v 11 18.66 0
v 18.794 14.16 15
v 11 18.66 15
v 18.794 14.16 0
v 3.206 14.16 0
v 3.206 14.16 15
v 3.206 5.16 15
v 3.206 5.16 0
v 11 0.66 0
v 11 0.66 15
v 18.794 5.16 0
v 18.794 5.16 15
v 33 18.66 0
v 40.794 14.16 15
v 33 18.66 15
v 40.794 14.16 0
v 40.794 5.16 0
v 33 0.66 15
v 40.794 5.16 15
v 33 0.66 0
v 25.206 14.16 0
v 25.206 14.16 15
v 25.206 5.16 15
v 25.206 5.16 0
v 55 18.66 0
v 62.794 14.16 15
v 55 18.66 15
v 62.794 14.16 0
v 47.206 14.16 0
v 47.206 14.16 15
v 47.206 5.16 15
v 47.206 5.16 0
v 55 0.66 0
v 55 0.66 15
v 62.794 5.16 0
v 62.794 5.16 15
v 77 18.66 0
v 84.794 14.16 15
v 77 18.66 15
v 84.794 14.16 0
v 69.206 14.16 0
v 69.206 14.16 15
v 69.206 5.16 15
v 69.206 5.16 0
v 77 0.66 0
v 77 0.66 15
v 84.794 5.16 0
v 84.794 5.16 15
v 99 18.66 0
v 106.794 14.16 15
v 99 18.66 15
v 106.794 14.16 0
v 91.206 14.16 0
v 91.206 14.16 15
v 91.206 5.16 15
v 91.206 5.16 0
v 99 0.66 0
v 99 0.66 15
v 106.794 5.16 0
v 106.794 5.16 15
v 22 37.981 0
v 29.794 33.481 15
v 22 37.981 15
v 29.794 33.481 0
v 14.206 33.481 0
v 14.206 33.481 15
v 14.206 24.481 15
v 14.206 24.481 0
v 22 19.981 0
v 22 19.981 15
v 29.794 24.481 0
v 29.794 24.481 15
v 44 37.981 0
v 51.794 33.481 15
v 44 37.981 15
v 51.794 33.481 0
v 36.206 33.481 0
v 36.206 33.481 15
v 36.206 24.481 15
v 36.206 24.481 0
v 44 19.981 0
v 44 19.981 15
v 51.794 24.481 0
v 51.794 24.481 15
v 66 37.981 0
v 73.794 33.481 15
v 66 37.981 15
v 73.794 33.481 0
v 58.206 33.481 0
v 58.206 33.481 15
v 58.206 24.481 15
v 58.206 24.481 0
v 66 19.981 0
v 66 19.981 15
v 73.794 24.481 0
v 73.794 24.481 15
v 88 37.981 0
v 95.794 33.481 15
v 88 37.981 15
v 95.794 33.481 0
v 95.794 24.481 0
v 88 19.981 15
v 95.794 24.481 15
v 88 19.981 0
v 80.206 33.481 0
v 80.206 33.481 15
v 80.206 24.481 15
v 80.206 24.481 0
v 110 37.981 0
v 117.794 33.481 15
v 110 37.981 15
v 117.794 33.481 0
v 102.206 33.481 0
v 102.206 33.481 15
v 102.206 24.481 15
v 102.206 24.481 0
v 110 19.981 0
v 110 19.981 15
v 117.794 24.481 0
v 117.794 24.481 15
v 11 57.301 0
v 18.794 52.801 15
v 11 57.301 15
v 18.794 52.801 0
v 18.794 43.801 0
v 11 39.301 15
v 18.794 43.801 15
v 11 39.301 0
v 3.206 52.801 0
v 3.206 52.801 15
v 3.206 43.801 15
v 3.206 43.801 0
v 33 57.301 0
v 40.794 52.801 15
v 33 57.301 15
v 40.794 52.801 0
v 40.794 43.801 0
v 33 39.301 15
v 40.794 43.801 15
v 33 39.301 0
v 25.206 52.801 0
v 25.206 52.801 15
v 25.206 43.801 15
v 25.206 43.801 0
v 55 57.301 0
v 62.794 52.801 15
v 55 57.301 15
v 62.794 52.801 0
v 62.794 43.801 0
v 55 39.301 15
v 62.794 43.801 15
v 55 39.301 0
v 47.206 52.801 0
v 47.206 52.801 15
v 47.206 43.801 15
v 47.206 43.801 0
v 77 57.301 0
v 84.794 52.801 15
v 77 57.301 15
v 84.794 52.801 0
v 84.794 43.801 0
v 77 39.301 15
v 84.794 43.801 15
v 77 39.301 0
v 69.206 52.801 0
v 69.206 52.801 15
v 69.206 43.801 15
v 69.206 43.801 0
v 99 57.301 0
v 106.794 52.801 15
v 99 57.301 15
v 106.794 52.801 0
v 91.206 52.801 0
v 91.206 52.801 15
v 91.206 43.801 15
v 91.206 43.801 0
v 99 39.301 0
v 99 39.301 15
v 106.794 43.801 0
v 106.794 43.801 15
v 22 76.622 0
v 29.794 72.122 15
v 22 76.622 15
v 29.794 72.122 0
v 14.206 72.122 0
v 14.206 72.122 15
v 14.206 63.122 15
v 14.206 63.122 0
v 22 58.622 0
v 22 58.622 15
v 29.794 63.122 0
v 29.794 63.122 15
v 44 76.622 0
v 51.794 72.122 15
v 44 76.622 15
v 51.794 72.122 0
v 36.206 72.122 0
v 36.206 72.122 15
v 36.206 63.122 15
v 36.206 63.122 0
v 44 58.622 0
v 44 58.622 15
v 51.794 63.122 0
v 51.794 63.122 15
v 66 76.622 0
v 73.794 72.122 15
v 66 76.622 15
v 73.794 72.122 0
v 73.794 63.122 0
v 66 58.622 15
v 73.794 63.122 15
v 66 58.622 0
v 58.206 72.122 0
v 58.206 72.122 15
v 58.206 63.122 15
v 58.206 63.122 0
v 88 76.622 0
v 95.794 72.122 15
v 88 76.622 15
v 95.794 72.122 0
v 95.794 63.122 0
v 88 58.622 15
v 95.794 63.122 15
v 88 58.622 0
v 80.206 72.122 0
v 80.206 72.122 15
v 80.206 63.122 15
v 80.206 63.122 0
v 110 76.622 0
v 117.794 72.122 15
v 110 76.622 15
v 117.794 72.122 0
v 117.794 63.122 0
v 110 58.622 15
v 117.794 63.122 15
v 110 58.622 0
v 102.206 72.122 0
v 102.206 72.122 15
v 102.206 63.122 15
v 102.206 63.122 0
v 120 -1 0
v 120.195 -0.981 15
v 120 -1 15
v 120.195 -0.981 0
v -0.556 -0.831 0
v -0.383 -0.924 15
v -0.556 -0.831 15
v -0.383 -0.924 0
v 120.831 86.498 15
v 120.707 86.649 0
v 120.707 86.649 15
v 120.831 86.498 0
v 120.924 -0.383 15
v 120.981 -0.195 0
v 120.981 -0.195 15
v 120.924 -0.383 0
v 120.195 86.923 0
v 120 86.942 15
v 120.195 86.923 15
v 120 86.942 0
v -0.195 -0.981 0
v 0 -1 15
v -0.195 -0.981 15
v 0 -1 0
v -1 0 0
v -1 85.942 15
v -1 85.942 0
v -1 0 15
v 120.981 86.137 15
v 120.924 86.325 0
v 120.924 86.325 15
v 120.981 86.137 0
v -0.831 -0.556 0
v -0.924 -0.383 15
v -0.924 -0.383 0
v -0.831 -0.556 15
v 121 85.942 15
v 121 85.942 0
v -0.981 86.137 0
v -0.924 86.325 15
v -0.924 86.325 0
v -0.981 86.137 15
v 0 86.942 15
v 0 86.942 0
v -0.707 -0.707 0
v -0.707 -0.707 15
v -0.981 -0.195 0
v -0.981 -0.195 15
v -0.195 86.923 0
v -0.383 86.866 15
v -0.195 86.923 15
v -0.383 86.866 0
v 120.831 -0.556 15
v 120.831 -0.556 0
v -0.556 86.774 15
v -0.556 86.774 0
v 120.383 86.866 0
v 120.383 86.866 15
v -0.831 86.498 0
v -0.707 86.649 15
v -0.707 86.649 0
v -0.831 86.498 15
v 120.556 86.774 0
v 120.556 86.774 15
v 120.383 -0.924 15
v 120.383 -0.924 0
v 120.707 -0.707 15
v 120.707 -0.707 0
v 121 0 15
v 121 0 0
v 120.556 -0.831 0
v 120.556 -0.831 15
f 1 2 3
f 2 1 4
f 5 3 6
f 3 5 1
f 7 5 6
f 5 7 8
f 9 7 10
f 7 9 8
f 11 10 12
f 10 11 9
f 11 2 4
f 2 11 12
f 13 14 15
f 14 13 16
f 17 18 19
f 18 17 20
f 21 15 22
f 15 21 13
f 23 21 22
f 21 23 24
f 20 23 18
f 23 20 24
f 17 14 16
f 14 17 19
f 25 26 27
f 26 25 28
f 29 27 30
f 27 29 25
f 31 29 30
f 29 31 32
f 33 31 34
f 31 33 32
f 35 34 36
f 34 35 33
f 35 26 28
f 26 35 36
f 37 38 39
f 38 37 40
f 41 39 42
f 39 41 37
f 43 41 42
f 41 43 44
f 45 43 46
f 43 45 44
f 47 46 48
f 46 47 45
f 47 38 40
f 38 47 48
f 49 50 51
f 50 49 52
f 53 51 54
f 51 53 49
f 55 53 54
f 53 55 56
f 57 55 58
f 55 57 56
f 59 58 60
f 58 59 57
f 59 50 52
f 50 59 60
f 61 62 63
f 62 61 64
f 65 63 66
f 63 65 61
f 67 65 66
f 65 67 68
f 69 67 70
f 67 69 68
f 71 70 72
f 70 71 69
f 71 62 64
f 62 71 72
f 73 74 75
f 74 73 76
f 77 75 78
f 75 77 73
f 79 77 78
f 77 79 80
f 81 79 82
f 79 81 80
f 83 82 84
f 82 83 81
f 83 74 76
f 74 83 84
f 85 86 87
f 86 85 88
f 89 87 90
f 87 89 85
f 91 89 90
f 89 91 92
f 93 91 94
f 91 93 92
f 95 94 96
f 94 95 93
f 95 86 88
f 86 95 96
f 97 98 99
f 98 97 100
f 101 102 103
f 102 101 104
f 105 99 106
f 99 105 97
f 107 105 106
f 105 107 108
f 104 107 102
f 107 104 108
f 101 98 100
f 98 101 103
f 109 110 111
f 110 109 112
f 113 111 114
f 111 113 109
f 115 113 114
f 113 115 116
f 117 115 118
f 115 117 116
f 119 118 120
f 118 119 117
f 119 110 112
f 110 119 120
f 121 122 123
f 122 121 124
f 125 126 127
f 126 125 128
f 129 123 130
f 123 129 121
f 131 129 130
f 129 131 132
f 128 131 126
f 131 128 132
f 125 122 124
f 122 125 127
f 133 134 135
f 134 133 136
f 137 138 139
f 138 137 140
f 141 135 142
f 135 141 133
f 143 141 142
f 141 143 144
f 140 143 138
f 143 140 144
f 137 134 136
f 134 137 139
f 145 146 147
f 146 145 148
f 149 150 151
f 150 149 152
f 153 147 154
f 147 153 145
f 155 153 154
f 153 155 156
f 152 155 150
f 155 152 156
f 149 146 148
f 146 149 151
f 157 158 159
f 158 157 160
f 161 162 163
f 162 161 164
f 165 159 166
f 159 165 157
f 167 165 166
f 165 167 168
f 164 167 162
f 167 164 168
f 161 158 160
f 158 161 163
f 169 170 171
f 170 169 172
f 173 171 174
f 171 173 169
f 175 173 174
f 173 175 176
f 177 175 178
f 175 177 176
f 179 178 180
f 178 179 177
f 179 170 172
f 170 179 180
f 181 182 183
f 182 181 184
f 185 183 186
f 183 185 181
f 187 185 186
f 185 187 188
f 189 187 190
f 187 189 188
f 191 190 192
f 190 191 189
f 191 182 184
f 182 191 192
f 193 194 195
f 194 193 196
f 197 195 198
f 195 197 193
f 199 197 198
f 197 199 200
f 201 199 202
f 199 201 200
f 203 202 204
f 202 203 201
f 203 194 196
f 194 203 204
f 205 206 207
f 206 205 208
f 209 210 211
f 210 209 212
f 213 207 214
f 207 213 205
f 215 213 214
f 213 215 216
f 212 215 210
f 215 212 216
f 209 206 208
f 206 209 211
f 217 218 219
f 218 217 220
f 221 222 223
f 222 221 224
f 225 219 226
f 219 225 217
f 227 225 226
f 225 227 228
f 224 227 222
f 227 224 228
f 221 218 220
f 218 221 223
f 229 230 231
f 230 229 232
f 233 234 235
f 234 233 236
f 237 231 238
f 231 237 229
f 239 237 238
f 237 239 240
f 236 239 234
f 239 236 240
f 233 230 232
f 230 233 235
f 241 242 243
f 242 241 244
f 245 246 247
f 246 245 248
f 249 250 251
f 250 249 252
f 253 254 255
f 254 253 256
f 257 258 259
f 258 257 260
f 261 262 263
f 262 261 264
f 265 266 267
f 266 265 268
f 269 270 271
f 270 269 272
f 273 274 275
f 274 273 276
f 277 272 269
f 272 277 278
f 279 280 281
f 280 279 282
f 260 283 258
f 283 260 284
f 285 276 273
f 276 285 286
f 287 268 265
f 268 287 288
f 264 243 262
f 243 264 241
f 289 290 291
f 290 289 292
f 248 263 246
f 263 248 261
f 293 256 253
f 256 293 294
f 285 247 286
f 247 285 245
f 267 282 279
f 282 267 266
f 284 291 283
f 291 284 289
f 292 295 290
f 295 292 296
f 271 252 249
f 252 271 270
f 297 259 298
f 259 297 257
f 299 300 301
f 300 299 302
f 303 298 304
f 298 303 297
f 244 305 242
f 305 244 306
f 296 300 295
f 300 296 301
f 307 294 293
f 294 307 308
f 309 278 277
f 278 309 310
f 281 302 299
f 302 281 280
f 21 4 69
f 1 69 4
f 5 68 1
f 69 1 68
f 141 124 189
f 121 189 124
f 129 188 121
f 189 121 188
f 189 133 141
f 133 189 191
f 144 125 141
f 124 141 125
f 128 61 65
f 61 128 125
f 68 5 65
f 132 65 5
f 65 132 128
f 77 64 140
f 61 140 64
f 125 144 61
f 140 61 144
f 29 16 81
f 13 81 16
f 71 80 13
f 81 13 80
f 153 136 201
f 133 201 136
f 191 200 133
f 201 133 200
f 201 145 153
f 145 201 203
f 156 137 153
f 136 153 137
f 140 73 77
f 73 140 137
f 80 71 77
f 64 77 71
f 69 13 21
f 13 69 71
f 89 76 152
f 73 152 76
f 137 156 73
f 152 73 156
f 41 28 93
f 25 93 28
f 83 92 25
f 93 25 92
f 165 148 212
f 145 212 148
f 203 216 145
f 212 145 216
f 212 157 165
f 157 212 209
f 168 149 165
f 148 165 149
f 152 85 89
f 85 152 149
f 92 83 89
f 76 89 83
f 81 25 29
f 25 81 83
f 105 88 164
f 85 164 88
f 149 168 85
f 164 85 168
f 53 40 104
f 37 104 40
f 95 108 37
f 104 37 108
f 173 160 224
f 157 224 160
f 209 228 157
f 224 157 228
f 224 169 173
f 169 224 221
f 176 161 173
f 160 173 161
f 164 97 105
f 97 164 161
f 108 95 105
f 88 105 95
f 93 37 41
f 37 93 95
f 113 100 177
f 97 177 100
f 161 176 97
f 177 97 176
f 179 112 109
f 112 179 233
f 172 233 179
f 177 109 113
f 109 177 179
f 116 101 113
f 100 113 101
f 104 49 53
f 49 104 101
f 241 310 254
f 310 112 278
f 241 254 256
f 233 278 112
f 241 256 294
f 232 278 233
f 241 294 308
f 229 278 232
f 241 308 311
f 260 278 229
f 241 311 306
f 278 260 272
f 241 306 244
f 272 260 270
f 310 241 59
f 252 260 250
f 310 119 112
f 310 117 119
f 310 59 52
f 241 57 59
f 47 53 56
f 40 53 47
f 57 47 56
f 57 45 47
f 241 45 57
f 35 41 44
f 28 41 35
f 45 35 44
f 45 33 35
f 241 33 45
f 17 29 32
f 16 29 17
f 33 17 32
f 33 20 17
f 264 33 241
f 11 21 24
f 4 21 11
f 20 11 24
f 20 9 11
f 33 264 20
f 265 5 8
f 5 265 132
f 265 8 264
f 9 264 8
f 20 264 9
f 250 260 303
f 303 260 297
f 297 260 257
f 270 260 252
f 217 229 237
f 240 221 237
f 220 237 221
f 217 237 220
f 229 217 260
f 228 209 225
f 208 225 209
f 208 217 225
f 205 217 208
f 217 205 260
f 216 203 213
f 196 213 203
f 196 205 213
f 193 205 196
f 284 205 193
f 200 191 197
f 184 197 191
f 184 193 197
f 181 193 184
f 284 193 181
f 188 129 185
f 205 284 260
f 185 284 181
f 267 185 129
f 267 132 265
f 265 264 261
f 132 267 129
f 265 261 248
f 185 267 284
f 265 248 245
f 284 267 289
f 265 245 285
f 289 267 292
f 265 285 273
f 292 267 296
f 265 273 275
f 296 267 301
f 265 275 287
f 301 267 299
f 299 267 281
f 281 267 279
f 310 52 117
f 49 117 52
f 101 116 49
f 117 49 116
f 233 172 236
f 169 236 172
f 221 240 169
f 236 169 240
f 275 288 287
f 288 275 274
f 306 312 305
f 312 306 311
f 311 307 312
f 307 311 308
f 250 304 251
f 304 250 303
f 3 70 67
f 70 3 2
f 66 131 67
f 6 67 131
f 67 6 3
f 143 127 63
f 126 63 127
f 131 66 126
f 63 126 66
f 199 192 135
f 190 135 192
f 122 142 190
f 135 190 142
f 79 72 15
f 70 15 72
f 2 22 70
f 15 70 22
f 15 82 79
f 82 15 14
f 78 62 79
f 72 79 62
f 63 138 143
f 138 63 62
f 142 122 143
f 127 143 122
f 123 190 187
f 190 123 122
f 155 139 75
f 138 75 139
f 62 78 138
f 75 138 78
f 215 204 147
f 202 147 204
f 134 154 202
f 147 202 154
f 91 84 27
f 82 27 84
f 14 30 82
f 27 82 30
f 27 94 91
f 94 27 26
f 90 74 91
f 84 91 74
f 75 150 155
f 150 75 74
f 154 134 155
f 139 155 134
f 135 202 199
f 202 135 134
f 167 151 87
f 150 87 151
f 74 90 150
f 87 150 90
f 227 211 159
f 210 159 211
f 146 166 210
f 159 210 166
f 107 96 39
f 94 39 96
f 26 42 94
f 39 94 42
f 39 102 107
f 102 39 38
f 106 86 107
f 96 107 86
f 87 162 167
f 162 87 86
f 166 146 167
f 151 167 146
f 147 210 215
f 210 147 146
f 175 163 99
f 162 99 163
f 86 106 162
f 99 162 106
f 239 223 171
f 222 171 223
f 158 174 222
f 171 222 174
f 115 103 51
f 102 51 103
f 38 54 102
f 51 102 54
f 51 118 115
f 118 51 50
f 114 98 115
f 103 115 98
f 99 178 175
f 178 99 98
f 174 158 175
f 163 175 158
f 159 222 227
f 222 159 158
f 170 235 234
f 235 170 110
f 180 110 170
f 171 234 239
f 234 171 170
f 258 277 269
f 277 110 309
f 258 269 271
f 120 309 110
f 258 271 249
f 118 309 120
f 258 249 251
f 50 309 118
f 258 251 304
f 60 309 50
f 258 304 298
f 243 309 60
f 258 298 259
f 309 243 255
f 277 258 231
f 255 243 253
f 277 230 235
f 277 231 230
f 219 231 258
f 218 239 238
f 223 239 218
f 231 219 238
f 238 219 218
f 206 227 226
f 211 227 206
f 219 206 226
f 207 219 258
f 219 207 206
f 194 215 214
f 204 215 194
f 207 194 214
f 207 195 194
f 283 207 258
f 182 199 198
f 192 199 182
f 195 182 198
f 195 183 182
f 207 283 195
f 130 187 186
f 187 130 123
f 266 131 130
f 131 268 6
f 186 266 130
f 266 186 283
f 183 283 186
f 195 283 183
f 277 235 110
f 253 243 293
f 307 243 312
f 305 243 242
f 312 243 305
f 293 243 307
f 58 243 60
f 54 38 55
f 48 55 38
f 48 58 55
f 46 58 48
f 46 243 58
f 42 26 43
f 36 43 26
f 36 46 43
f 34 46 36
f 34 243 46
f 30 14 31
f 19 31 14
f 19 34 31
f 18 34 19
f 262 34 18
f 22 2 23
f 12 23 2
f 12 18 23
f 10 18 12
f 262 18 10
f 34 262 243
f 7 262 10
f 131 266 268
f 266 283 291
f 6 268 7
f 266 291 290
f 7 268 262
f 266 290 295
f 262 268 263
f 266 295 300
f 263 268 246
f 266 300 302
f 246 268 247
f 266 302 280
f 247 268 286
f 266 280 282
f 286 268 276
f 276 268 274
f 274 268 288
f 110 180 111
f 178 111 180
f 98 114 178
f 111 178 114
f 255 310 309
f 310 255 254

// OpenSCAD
// Honeycomb Grid Pattern
// Creates hexagonal grid patterns for organizers, decorations, or infill
// License: CC0 (Public Domain)

/* [Grid Size] */
// Number of hexagons in X direction
cells_x = 5; // [2:20]

// Number of hexagons in Y direction
cells_y = 4; // [2:20]

// Size of each hexagon (flat-to-flat distance)
cell_size = 20; // [5:50]

/* [Dimensions] */
// Wall thickness between cells
wall_thickness = 2; // [1:0.5:5]

// Grid height (depth)
grid_height = 15; // [3:50]

// Add a bottom plate
include_bottom = "no"; // [yes, no]

// Bottom plate thickness
bottom_thickness = 1.5; // [0.5:0.5:5]

/* [Style] */
// Cell shape
cell_shape = "hexagon"; // [hexagon, circle, rounded_hex]

// Rounding for rounded_hex
hex_rounding = 2; // [0:5]

/* [Quality] */
// Render quality
$fn = 32; // [16:64]

/* [Hidden] */
// Hexagon math
hex_radius = cell_size / 2;
hex_apothem = hex_radius * cos(30);  // Distance from center to flat edge
col_spacing = cell_size + wall_thickness;
row_spacing = (hex_apothem * 2) + wall_thickness;

// Calculate overall dimensions
total_width = (cells_x * col_spacing) + (cell_size / 2);
total_depth = (cells_y * row_spacing) + hex_apothem;

module honeycomb_grid() {
    difference() {
        // Outer frame
        linear_extrude(height = grid_height)
            offset(r = wall_thickness/2)
            square([total_width, total_depth]);
        
        // Hexagonal cells
        translate([0, 0, include_bottom == "yes" ? bottom_thickness : -0.1])
            for (y = [0:cells_y-1]) {
                for (x = [0:cells_x-1]) {
                    translate([
                        hex_radius + wall_thickness/2 + (x * col_spacing) + ((y % 2) * (col_spacing / 2)),
                        hex_apothem + wall_thickness/2 + (y * row_spacing),
                        0
                    ])
                    create_cell(grid_height + 1);
                }
            }
    }
}

module create_cell(h) {
    if (cell_shape == "hexagon") {
        linear_extrude(height = h)
            hexagon(hex_radius - wall_thickness/2);
    } else if (cell_shape == "circle") {
        cylinder(r = hex_radius - wall_thickness/2, h = h);
    } else if (cell_shape == "rounded_hex") {
        linear_extrude(height = h)
            offset(r = hex_rounding)
            offset(r = -hex_rounding)
            hexagon(hex_radius - wall_thickness/2);
    }
}

module hexagon(radius) {
    polygon([
        for (i = [0:5])
            [radius * cos(60*i + 30), radius * sin(60*i + 30)]
    ]);
}

// Render
honeycomb_grid();
